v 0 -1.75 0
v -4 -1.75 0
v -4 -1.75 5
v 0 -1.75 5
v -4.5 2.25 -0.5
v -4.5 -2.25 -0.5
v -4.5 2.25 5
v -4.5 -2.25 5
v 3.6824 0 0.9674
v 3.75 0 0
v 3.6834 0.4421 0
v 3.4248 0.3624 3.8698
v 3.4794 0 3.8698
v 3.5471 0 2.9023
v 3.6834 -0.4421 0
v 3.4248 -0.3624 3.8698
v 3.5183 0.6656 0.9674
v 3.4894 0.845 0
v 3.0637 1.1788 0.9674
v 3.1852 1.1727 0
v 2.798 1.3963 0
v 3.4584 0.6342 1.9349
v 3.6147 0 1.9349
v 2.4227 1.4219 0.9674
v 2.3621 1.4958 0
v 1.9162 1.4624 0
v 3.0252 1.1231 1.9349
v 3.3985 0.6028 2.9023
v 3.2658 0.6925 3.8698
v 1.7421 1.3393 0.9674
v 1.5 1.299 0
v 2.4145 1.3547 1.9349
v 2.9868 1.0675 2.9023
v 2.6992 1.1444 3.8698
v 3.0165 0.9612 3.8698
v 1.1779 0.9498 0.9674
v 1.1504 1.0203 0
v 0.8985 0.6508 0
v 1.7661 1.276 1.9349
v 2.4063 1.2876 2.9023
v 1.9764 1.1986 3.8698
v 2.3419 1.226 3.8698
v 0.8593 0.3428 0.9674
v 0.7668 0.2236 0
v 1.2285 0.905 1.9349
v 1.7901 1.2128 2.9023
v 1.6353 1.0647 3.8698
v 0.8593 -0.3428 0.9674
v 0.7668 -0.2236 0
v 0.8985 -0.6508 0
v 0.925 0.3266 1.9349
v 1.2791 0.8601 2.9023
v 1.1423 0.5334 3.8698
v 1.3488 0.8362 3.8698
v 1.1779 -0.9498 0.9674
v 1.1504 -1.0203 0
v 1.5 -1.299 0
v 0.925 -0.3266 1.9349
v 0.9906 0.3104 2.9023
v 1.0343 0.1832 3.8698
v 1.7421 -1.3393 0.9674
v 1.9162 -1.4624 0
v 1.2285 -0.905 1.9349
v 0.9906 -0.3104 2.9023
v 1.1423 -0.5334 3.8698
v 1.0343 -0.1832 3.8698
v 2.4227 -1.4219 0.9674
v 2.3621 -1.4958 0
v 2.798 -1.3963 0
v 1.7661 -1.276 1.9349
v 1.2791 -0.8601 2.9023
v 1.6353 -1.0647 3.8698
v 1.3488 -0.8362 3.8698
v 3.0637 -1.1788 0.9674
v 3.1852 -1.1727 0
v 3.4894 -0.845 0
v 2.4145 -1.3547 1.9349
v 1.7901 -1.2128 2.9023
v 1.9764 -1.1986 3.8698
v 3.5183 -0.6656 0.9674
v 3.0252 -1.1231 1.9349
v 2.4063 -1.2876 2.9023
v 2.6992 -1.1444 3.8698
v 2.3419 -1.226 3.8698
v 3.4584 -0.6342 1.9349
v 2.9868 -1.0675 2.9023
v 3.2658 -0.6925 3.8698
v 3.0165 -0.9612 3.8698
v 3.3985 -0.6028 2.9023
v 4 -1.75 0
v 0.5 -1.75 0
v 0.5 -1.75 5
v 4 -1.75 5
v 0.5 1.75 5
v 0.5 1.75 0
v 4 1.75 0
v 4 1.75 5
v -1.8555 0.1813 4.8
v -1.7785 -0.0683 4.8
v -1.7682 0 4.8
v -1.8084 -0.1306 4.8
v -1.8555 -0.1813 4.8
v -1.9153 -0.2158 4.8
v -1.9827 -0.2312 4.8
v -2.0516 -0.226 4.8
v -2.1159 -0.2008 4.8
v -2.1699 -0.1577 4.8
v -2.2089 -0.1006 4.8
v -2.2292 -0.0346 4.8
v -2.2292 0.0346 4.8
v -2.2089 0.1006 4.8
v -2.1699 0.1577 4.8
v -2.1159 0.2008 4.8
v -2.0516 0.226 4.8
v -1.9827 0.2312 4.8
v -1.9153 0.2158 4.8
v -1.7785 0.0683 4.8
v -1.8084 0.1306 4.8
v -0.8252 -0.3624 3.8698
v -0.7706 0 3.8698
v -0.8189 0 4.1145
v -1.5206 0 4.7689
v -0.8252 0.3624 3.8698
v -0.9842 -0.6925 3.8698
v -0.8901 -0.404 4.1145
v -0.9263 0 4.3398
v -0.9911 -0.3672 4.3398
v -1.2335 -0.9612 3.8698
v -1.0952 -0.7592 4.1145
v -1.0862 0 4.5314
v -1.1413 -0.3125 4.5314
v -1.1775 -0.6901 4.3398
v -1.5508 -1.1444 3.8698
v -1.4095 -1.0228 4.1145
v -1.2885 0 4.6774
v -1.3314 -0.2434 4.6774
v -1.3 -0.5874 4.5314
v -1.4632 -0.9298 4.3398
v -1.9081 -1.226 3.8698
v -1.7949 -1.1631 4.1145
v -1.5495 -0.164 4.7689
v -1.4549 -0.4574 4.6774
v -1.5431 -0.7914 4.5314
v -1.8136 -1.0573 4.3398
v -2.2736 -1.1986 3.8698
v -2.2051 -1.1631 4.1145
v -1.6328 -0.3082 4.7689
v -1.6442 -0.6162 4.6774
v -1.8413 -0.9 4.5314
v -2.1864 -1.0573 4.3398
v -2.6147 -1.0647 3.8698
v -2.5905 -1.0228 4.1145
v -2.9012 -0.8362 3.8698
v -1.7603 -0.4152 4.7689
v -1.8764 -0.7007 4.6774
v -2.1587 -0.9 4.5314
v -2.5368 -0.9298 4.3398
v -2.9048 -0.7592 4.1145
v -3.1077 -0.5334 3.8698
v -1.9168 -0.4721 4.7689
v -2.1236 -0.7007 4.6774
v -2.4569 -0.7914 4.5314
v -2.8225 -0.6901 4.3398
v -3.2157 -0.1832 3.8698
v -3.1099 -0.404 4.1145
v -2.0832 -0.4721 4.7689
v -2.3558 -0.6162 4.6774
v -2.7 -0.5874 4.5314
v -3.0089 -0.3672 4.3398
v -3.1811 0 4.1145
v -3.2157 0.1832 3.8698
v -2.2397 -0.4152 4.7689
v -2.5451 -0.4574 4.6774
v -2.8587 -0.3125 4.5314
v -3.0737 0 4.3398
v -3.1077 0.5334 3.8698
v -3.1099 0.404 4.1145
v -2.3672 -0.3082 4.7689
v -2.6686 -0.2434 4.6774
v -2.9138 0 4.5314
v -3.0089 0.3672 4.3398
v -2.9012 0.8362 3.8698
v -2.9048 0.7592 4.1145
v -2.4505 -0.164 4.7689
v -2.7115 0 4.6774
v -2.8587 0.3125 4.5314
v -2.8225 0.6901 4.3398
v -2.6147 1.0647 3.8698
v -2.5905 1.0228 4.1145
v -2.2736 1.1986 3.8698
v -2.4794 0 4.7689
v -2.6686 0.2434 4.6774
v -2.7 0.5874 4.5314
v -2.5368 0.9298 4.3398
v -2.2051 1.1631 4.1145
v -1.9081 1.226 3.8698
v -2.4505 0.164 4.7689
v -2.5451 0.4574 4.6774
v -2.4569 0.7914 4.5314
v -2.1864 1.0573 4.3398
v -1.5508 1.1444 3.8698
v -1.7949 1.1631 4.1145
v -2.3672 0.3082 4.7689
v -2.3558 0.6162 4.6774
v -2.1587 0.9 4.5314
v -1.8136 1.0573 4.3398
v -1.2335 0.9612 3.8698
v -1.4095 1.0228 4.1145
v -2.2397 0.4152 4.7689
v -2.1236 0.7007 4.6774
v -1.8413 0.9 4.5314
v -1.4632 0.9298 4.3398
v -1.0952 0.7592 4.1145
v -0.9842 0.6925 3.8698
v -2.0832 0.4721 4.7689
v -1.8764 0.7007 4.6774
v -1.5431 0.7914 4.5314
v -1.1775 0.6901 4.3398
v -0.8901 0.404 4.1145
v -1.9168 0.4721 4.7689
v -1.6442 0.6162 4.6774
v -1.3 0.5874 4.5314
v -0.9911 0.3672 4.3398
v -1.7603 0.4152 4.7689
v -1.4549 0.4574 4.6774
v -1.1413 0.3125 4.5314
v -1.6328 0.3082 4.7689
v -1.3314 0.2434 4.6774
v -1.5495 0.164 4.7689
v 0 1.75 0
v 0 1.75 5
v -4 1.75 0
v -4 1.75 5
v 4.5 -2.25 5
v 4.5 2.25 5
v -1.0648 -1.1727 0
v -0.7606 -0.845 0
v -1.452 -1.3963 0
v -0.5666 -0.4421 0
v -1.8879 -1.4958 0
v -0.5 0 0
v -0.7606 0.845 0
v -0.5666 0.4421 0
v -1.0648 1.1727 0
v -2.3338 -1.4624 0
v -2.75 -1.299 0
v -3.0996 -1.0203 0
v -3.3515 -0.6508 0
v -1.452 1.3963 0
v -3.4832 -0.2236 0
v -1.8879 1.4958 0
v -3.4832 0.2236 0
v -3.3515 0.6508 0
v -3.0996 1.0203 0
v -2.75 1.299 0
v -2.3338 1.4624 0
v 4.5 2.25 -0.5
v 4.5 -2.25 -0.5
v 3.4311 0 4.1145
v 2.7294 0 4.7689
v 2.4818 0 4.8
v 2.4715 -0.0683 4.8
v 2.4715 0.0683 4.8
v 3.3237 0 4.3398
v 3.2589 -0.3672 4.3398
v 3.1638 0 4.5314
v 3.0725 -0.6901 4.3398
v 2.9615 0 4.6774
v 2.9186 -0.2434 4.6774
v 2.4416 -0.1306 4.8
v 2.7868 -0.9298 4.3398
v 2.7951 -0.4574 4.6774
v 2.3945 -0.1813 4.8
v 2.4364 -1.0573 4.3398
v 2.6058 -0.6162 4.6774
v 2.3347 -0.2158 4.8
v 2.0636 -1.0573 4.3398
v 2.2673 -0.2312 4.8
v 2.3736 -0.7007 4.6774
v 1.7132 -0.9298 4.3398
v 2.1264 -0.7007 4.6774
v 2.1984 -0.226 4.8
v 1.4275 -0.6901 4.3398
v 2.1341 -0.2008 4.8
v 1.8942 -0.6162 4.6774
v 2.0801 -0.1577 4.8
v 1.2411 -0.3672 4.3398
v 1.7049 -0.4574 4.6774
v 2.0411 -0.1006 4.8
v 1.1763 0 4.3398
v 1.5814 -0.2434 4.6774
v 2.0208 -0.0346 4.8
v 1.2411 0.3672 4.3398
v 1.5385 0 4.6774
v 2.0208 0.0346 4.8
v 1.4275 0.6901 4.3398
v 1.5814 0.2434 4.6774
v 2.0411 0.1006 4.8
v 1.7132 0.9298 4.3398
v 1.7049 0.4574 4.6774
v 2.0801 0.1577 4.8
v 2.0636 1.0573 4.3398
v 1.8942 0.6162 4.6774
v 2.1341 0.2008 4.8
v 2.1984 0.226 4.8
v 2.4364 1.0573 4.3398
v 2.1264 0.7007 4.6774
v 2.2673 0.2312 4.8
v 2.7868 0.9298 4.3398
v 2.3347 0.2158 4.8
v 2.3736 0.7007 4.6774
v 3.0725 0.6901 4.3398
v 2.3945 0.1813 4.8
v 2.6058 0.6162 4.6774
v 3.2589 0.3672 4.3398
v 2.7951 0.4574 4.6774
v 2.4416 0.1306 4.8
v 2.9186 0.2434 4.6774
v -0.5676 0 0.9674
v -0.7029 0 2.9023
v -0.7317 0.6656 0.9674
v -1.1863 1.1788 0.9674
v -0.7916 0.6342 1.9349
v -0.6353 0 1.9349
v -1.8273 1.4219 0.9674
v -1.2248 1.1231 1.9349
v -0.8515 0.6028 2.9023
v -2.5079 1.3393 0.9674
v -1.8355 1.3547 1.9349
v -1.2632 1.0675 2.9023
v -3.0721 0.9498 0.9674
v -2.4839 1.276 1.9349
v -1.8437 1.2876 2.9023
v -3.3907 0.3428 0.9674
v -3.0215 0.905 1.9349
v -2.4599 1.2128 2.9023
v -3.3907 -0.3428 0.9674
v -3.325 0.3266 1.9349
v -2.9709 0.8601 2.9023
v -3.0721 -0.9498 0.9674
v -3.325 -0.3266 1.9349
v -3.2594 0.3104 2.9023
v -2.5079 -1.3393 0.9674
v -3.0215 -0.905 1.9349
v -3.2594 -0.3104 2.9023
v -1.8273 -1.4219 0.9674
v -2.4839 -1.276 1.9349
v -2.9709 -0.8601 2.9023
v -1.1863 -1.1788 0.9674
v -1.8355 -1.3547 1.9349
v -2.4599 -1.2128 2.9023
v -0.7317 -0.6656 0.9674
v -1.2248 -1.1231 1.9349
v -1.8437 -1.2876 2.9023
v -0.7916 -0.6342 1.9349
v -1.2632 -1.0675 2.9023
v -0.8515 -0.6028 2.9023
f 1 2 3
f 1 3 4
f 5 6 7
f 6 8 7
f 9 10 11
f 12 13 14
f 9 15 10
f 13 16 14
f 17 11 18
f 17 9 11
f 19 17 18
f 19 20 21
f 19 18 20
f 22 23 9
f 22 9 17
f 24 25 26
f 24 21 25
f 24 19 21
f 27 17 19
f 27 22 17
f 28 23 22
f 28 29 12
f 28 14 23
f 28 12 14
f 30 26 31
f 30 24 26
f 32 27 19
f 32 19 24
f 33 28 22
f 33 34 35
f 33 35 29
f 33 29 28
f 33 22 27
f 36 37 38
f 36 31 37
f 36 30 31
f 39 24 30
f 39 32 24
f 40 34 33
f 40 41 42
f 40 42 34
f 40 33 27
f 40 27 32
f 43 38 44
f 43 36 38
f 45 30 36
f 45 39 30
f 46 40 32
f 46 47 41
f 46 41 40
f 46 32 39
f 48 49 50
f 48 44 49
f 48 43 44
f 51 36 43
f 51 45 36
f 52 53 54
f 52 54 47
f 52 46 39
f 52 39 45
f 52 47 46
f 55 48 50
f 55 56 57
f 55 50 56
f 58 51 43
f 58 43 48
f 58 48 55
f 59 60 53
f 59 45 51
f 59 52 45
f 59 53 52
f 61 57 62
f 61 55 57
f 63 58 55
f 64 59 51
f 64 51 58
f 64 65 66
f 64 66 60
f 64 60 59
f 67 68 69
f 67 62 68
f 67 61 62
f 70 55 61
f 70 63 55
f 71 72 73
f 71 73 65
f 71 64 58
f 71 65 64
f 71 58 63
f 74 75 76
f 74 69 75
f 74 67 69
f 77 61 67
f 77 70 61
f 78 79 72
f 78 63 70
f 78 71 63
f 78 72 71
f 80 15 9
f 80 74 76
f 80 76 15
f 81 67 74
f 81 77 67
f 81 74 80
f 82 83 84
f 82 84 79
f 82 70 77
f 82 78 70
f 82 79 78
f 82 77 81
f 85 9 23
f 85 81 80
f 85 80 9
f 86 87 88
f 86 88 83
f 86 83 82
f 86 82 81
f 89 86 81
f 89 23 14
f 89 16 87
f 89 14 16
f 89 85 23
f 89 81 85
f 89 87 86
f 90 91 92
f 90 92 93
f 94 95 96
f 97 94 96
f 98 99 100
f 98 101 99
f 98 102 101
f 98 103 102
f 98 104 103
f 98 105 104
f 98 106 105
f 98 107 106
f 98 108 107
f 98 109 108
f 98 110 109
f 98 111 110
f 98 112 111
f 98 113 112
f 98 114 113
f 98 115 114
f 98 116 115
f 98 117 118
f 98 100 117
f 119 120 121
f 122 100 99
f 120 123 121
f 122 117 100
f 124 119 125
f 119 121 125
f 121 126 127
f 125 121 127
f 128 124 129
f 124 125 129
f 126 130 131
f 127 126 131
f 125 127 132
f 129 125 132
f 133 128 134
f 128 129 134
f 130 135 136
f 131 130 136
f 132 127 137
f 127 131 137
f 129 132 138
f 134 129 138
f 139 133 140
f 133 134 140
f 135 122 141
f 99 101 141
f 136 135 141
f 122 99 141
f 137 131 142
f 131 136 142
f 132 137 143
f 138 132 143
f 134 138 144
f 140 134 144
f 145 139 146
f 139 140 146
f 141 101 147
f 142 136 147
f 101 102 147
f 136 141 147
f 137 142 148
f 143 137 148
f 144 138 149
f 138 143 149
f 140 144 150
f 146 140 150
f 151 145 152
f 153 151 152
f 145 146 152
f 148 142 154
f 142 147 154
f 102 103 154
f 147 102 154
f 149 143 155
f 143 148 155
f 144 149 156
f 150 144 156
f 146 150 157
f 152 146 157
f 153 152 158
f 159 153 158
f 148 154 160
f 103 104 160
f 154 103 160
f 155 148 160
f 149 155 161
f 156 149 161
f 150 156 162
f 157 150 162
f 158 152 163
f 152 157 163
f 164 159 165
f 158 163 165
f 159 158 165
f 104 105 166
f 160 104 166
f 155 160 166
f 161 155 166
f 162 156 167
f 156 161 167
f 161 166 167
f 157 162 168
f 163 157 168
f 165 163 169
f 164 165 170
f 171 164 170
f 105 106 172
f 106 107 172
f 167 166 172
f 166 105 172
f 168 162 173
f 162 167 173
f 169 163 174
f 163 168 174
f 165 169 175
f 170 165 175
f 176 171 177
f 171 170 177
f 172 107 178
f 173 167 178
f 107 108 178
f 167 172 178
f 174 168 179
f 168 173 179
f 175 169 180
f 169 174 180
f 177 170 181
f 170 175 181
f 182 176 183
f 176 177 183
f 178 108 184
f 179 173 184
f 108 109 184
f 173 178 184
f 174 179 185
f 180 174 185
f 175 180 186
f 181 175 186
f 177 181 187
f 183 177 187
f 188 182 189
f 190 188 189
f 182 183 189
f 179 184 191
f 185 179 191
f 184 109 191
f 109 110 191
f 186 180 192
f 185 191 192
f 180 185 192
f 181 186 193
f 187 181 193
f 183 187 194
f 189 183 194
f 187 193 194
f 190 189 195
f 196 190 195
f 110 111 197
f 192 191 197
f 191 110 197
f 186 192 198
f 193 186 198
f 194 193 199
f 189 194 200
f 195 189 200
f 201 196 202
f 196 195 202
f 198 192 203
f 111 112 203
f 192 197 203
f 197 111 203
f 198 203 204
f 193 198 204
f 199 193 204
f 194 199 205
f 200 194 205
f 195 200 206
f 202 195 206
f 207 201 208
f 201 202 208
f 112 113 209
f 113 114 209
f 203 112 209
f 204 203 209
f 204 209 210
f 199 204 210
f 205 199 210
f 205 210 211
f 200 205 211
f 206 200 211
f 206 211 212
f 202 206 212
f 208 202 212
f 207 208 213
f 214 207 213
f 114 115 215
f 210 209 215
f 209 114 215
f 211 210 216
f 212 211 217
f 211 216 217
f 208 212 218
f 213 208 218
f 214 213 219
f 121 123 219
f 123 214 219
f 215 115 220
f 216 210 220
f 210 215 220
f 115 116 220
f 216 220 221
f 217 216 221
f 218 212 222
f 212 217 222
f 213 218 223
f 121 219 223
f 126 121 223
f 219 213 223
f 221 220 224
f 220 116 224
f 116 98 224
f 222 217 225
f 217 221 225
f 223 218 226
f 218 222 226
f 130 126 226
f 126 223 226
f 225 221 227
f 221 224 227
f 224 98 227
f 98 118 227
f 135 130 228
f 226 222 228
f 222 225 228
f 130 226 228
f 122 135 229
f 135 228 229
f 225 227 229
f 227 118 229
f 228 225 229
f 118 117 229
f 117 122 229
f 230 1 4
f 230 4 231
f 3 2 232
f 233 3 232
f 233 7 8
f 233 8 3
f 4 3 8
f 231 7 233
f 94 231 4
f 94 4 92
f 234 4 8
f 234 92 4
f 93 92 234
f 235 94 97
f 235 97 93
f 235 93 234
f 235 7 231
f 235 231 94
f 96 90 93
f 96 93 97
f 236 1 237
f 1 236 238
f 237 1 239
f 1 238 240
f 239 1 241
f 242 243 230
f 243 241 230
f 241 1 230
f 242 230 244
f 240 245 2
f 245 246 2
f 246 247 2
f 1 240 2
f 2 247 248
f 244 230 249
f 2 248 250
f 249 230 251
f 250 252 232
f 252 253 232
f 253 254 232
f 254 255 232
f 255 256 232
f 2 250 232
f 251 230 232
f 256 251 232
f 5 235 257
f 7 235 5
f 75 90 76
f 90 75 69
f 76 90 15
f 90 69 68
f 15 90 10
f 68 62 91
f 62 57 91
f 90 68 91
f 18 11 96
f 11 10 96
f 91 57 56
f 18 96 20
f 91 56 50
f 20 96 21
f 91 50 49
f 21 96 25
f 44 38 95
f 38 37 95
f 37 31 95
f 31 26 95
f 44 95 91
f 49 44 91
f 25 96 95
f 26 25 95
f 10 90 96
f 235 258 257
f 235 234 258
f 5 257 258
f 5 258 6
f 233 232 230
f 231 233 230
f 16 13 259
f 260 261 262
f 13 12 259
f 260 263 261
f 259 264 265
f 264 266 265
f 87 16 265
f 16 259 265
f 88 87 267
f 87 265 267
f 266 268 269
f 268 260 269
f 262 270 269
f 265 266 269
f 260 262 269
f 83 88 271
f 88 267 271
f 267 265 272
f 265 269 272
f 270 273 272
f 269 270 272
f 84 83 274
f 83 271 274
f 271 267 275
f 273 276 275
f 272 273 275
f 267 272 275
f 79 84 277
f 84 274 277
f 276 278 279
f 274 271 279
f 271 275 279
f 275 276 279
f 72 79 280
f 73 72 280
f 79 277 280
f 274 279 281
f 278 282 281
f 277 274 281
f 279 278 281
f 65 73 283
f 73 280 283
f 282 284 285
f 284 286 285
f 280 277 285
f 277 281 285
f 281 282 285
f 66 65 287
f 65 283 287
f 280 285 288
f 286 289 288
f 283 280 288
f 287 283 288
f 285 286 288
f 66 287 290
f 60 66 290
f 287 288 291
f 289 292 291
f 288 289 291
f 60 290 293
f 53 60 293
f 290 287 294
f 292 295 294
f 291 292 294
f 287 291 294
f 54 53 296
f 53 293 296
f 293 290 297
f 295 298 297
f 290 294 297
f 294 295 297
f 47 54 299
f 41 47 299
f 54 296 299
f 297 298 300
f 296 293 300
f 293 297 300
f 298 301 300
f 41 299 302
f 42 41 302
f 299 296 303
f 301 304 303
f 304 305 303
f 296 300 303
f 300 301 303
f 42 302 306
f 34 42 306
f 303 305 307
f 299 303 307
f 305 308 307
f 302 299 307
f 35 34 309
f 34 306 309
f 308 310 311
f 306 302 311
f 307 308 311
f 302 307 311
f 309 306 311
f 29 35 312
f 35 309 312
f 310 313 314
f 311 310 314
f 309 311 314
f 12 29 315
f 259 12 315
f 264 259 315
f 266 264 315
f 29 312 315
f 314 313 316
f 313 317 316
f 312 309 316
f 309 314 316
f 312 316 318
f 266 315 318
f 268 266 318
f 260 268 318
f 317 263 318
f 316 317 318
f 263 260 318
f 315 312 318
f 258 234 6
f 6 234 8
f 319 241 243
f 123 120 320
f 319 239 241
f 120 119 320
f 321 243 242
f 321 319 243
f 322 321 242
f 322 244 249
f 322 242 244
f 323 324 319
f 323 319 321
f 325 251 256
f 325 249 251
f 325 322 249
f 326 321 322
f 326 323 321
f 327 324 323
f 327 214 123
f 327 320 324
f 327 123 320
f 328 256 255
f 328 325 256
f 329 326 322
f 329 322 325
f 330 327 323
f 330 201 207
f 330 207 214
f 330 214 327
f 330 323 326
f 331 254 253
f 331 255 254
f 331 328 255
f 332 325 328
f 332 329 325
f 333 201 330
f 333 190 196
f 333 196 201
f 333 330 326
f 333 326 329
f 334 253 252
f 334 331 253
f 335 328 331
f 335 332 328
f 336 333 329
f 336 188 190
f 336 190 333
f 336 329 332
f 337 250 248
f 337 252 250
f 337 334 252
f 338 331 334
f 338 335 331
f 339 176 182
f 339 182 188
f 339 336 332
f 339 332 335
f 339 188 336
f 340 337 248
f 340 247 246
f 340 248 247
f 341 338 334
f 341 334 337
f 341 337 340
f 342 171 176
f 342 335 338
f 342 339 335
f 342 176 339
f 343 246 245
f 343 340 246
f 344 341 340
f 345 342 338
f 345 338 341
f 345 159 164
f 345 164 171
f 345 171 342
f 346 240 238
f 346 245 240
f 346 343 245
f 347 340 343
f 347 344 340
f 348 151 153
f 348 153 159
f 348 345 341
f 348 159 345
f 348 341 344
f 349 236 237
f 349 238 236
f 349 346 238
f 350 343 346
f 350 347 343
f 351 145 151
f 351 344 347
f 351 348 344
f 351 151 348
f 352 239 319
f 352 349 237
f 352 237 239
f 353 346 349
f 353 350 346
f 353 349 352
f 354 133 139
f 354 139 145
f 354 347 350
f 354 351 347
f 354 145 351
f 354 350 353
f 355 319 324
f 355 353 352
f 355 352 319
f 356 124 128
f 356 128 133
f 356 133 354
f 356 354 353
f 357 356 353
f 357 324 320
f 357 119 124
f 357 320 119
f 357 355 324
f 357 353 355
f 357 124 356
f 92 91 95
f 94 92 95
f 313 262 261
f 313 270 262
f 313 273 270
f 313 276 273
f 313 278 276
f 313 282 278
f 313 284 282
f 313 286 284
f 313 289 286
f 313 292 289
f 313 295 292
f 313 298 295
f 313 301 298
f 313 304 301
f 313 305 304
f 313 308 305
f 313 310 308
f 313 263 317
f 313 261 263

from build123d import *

# Parameters (mm, degrees)
SKETCH1_W             = 0.5
SKETCH1_H             = 4.5
EXTRUDE_THIN2_DEPTH   = 5
SKETCH1_W_2           = 9
SKETCH1_W_3           = 8
SKETCH1_H_2           = 3.5
EXTRUDE_THIN2_2_DEPTH = 5
SKETCH2_W             = 9
SKETCH2_H             = 4.5
BOSS_EXTRUDE1_DEPTH   = 0.5
SKETCH4_R             = 1.5
BOSS_EXTRUDE3_DEPTH   = 4.8
BOSS_EXTRUDE3_TAPER   = 4
FILLET1_R             = 1


with BuildPart() as part:
    # Sketch1 → Extrude-Thin2 (new body)
    with BuildSketch(Plane.XY):
        with Locations((0.25, 0)):
            Rectangle(SKETCH1_W, SKETCH1_H)
    extrude(amount=EXTRUDE_THIN2_DEPTH)



with BuildPart() as body_2:
    # Sketch1 → Extrude-Thin2 2 (new body)
    with BuildSketch(Plane.XY):
        Rectangle(SKETCH1_W_2, SKETCH1_H)
        Rectangle(SKETCH1_W_3, SKETCH1_H_2, mode=Mode.SUBTRACT)
    extrude(amount=EXTRUDE_THIN2_2_DEPTH)


with BuildPart() as part_1:
    add(part.part)

    add(body_2.part)  # Boss-Extrude1 merges body 2
    # Sketch2 → Boss-Extrude1 (add)
    with BuildSketch(Plane(origin=(0, 0, 0), x_dir=(-1, 0, 0), z_dir=(0, 0, -1))):
        Rectangle(SKETCH2_W, SKETCH2_H)
    extrude(amount=BOSS_EXTRUDE1_DEPTH)

    # Sketch4 → Boss-Extrude3 (add)
    with BuildSketch(Plane.XY):
        with Locations((2.25, 0)):
            Circle(SKETCH4_R)
        with Locations((-2, 0)):
            Circle(SKETCH4_R)
    extrude(amount=BOSS_EXTRUDE3_DEPTH, taper=BOSS_EXTRUDE3_TAPER)

    # Fillet1
    fillet1_edges = [part_1.edges().sort_by_distance(p)[0] for p in [
        (1.085648697, 0, 4.8),
        (-3.164351303, 0, 4.8),
    ]]
    fillet(fillet1_edges, radius=FILLET1_R)


solid = part_1.part
